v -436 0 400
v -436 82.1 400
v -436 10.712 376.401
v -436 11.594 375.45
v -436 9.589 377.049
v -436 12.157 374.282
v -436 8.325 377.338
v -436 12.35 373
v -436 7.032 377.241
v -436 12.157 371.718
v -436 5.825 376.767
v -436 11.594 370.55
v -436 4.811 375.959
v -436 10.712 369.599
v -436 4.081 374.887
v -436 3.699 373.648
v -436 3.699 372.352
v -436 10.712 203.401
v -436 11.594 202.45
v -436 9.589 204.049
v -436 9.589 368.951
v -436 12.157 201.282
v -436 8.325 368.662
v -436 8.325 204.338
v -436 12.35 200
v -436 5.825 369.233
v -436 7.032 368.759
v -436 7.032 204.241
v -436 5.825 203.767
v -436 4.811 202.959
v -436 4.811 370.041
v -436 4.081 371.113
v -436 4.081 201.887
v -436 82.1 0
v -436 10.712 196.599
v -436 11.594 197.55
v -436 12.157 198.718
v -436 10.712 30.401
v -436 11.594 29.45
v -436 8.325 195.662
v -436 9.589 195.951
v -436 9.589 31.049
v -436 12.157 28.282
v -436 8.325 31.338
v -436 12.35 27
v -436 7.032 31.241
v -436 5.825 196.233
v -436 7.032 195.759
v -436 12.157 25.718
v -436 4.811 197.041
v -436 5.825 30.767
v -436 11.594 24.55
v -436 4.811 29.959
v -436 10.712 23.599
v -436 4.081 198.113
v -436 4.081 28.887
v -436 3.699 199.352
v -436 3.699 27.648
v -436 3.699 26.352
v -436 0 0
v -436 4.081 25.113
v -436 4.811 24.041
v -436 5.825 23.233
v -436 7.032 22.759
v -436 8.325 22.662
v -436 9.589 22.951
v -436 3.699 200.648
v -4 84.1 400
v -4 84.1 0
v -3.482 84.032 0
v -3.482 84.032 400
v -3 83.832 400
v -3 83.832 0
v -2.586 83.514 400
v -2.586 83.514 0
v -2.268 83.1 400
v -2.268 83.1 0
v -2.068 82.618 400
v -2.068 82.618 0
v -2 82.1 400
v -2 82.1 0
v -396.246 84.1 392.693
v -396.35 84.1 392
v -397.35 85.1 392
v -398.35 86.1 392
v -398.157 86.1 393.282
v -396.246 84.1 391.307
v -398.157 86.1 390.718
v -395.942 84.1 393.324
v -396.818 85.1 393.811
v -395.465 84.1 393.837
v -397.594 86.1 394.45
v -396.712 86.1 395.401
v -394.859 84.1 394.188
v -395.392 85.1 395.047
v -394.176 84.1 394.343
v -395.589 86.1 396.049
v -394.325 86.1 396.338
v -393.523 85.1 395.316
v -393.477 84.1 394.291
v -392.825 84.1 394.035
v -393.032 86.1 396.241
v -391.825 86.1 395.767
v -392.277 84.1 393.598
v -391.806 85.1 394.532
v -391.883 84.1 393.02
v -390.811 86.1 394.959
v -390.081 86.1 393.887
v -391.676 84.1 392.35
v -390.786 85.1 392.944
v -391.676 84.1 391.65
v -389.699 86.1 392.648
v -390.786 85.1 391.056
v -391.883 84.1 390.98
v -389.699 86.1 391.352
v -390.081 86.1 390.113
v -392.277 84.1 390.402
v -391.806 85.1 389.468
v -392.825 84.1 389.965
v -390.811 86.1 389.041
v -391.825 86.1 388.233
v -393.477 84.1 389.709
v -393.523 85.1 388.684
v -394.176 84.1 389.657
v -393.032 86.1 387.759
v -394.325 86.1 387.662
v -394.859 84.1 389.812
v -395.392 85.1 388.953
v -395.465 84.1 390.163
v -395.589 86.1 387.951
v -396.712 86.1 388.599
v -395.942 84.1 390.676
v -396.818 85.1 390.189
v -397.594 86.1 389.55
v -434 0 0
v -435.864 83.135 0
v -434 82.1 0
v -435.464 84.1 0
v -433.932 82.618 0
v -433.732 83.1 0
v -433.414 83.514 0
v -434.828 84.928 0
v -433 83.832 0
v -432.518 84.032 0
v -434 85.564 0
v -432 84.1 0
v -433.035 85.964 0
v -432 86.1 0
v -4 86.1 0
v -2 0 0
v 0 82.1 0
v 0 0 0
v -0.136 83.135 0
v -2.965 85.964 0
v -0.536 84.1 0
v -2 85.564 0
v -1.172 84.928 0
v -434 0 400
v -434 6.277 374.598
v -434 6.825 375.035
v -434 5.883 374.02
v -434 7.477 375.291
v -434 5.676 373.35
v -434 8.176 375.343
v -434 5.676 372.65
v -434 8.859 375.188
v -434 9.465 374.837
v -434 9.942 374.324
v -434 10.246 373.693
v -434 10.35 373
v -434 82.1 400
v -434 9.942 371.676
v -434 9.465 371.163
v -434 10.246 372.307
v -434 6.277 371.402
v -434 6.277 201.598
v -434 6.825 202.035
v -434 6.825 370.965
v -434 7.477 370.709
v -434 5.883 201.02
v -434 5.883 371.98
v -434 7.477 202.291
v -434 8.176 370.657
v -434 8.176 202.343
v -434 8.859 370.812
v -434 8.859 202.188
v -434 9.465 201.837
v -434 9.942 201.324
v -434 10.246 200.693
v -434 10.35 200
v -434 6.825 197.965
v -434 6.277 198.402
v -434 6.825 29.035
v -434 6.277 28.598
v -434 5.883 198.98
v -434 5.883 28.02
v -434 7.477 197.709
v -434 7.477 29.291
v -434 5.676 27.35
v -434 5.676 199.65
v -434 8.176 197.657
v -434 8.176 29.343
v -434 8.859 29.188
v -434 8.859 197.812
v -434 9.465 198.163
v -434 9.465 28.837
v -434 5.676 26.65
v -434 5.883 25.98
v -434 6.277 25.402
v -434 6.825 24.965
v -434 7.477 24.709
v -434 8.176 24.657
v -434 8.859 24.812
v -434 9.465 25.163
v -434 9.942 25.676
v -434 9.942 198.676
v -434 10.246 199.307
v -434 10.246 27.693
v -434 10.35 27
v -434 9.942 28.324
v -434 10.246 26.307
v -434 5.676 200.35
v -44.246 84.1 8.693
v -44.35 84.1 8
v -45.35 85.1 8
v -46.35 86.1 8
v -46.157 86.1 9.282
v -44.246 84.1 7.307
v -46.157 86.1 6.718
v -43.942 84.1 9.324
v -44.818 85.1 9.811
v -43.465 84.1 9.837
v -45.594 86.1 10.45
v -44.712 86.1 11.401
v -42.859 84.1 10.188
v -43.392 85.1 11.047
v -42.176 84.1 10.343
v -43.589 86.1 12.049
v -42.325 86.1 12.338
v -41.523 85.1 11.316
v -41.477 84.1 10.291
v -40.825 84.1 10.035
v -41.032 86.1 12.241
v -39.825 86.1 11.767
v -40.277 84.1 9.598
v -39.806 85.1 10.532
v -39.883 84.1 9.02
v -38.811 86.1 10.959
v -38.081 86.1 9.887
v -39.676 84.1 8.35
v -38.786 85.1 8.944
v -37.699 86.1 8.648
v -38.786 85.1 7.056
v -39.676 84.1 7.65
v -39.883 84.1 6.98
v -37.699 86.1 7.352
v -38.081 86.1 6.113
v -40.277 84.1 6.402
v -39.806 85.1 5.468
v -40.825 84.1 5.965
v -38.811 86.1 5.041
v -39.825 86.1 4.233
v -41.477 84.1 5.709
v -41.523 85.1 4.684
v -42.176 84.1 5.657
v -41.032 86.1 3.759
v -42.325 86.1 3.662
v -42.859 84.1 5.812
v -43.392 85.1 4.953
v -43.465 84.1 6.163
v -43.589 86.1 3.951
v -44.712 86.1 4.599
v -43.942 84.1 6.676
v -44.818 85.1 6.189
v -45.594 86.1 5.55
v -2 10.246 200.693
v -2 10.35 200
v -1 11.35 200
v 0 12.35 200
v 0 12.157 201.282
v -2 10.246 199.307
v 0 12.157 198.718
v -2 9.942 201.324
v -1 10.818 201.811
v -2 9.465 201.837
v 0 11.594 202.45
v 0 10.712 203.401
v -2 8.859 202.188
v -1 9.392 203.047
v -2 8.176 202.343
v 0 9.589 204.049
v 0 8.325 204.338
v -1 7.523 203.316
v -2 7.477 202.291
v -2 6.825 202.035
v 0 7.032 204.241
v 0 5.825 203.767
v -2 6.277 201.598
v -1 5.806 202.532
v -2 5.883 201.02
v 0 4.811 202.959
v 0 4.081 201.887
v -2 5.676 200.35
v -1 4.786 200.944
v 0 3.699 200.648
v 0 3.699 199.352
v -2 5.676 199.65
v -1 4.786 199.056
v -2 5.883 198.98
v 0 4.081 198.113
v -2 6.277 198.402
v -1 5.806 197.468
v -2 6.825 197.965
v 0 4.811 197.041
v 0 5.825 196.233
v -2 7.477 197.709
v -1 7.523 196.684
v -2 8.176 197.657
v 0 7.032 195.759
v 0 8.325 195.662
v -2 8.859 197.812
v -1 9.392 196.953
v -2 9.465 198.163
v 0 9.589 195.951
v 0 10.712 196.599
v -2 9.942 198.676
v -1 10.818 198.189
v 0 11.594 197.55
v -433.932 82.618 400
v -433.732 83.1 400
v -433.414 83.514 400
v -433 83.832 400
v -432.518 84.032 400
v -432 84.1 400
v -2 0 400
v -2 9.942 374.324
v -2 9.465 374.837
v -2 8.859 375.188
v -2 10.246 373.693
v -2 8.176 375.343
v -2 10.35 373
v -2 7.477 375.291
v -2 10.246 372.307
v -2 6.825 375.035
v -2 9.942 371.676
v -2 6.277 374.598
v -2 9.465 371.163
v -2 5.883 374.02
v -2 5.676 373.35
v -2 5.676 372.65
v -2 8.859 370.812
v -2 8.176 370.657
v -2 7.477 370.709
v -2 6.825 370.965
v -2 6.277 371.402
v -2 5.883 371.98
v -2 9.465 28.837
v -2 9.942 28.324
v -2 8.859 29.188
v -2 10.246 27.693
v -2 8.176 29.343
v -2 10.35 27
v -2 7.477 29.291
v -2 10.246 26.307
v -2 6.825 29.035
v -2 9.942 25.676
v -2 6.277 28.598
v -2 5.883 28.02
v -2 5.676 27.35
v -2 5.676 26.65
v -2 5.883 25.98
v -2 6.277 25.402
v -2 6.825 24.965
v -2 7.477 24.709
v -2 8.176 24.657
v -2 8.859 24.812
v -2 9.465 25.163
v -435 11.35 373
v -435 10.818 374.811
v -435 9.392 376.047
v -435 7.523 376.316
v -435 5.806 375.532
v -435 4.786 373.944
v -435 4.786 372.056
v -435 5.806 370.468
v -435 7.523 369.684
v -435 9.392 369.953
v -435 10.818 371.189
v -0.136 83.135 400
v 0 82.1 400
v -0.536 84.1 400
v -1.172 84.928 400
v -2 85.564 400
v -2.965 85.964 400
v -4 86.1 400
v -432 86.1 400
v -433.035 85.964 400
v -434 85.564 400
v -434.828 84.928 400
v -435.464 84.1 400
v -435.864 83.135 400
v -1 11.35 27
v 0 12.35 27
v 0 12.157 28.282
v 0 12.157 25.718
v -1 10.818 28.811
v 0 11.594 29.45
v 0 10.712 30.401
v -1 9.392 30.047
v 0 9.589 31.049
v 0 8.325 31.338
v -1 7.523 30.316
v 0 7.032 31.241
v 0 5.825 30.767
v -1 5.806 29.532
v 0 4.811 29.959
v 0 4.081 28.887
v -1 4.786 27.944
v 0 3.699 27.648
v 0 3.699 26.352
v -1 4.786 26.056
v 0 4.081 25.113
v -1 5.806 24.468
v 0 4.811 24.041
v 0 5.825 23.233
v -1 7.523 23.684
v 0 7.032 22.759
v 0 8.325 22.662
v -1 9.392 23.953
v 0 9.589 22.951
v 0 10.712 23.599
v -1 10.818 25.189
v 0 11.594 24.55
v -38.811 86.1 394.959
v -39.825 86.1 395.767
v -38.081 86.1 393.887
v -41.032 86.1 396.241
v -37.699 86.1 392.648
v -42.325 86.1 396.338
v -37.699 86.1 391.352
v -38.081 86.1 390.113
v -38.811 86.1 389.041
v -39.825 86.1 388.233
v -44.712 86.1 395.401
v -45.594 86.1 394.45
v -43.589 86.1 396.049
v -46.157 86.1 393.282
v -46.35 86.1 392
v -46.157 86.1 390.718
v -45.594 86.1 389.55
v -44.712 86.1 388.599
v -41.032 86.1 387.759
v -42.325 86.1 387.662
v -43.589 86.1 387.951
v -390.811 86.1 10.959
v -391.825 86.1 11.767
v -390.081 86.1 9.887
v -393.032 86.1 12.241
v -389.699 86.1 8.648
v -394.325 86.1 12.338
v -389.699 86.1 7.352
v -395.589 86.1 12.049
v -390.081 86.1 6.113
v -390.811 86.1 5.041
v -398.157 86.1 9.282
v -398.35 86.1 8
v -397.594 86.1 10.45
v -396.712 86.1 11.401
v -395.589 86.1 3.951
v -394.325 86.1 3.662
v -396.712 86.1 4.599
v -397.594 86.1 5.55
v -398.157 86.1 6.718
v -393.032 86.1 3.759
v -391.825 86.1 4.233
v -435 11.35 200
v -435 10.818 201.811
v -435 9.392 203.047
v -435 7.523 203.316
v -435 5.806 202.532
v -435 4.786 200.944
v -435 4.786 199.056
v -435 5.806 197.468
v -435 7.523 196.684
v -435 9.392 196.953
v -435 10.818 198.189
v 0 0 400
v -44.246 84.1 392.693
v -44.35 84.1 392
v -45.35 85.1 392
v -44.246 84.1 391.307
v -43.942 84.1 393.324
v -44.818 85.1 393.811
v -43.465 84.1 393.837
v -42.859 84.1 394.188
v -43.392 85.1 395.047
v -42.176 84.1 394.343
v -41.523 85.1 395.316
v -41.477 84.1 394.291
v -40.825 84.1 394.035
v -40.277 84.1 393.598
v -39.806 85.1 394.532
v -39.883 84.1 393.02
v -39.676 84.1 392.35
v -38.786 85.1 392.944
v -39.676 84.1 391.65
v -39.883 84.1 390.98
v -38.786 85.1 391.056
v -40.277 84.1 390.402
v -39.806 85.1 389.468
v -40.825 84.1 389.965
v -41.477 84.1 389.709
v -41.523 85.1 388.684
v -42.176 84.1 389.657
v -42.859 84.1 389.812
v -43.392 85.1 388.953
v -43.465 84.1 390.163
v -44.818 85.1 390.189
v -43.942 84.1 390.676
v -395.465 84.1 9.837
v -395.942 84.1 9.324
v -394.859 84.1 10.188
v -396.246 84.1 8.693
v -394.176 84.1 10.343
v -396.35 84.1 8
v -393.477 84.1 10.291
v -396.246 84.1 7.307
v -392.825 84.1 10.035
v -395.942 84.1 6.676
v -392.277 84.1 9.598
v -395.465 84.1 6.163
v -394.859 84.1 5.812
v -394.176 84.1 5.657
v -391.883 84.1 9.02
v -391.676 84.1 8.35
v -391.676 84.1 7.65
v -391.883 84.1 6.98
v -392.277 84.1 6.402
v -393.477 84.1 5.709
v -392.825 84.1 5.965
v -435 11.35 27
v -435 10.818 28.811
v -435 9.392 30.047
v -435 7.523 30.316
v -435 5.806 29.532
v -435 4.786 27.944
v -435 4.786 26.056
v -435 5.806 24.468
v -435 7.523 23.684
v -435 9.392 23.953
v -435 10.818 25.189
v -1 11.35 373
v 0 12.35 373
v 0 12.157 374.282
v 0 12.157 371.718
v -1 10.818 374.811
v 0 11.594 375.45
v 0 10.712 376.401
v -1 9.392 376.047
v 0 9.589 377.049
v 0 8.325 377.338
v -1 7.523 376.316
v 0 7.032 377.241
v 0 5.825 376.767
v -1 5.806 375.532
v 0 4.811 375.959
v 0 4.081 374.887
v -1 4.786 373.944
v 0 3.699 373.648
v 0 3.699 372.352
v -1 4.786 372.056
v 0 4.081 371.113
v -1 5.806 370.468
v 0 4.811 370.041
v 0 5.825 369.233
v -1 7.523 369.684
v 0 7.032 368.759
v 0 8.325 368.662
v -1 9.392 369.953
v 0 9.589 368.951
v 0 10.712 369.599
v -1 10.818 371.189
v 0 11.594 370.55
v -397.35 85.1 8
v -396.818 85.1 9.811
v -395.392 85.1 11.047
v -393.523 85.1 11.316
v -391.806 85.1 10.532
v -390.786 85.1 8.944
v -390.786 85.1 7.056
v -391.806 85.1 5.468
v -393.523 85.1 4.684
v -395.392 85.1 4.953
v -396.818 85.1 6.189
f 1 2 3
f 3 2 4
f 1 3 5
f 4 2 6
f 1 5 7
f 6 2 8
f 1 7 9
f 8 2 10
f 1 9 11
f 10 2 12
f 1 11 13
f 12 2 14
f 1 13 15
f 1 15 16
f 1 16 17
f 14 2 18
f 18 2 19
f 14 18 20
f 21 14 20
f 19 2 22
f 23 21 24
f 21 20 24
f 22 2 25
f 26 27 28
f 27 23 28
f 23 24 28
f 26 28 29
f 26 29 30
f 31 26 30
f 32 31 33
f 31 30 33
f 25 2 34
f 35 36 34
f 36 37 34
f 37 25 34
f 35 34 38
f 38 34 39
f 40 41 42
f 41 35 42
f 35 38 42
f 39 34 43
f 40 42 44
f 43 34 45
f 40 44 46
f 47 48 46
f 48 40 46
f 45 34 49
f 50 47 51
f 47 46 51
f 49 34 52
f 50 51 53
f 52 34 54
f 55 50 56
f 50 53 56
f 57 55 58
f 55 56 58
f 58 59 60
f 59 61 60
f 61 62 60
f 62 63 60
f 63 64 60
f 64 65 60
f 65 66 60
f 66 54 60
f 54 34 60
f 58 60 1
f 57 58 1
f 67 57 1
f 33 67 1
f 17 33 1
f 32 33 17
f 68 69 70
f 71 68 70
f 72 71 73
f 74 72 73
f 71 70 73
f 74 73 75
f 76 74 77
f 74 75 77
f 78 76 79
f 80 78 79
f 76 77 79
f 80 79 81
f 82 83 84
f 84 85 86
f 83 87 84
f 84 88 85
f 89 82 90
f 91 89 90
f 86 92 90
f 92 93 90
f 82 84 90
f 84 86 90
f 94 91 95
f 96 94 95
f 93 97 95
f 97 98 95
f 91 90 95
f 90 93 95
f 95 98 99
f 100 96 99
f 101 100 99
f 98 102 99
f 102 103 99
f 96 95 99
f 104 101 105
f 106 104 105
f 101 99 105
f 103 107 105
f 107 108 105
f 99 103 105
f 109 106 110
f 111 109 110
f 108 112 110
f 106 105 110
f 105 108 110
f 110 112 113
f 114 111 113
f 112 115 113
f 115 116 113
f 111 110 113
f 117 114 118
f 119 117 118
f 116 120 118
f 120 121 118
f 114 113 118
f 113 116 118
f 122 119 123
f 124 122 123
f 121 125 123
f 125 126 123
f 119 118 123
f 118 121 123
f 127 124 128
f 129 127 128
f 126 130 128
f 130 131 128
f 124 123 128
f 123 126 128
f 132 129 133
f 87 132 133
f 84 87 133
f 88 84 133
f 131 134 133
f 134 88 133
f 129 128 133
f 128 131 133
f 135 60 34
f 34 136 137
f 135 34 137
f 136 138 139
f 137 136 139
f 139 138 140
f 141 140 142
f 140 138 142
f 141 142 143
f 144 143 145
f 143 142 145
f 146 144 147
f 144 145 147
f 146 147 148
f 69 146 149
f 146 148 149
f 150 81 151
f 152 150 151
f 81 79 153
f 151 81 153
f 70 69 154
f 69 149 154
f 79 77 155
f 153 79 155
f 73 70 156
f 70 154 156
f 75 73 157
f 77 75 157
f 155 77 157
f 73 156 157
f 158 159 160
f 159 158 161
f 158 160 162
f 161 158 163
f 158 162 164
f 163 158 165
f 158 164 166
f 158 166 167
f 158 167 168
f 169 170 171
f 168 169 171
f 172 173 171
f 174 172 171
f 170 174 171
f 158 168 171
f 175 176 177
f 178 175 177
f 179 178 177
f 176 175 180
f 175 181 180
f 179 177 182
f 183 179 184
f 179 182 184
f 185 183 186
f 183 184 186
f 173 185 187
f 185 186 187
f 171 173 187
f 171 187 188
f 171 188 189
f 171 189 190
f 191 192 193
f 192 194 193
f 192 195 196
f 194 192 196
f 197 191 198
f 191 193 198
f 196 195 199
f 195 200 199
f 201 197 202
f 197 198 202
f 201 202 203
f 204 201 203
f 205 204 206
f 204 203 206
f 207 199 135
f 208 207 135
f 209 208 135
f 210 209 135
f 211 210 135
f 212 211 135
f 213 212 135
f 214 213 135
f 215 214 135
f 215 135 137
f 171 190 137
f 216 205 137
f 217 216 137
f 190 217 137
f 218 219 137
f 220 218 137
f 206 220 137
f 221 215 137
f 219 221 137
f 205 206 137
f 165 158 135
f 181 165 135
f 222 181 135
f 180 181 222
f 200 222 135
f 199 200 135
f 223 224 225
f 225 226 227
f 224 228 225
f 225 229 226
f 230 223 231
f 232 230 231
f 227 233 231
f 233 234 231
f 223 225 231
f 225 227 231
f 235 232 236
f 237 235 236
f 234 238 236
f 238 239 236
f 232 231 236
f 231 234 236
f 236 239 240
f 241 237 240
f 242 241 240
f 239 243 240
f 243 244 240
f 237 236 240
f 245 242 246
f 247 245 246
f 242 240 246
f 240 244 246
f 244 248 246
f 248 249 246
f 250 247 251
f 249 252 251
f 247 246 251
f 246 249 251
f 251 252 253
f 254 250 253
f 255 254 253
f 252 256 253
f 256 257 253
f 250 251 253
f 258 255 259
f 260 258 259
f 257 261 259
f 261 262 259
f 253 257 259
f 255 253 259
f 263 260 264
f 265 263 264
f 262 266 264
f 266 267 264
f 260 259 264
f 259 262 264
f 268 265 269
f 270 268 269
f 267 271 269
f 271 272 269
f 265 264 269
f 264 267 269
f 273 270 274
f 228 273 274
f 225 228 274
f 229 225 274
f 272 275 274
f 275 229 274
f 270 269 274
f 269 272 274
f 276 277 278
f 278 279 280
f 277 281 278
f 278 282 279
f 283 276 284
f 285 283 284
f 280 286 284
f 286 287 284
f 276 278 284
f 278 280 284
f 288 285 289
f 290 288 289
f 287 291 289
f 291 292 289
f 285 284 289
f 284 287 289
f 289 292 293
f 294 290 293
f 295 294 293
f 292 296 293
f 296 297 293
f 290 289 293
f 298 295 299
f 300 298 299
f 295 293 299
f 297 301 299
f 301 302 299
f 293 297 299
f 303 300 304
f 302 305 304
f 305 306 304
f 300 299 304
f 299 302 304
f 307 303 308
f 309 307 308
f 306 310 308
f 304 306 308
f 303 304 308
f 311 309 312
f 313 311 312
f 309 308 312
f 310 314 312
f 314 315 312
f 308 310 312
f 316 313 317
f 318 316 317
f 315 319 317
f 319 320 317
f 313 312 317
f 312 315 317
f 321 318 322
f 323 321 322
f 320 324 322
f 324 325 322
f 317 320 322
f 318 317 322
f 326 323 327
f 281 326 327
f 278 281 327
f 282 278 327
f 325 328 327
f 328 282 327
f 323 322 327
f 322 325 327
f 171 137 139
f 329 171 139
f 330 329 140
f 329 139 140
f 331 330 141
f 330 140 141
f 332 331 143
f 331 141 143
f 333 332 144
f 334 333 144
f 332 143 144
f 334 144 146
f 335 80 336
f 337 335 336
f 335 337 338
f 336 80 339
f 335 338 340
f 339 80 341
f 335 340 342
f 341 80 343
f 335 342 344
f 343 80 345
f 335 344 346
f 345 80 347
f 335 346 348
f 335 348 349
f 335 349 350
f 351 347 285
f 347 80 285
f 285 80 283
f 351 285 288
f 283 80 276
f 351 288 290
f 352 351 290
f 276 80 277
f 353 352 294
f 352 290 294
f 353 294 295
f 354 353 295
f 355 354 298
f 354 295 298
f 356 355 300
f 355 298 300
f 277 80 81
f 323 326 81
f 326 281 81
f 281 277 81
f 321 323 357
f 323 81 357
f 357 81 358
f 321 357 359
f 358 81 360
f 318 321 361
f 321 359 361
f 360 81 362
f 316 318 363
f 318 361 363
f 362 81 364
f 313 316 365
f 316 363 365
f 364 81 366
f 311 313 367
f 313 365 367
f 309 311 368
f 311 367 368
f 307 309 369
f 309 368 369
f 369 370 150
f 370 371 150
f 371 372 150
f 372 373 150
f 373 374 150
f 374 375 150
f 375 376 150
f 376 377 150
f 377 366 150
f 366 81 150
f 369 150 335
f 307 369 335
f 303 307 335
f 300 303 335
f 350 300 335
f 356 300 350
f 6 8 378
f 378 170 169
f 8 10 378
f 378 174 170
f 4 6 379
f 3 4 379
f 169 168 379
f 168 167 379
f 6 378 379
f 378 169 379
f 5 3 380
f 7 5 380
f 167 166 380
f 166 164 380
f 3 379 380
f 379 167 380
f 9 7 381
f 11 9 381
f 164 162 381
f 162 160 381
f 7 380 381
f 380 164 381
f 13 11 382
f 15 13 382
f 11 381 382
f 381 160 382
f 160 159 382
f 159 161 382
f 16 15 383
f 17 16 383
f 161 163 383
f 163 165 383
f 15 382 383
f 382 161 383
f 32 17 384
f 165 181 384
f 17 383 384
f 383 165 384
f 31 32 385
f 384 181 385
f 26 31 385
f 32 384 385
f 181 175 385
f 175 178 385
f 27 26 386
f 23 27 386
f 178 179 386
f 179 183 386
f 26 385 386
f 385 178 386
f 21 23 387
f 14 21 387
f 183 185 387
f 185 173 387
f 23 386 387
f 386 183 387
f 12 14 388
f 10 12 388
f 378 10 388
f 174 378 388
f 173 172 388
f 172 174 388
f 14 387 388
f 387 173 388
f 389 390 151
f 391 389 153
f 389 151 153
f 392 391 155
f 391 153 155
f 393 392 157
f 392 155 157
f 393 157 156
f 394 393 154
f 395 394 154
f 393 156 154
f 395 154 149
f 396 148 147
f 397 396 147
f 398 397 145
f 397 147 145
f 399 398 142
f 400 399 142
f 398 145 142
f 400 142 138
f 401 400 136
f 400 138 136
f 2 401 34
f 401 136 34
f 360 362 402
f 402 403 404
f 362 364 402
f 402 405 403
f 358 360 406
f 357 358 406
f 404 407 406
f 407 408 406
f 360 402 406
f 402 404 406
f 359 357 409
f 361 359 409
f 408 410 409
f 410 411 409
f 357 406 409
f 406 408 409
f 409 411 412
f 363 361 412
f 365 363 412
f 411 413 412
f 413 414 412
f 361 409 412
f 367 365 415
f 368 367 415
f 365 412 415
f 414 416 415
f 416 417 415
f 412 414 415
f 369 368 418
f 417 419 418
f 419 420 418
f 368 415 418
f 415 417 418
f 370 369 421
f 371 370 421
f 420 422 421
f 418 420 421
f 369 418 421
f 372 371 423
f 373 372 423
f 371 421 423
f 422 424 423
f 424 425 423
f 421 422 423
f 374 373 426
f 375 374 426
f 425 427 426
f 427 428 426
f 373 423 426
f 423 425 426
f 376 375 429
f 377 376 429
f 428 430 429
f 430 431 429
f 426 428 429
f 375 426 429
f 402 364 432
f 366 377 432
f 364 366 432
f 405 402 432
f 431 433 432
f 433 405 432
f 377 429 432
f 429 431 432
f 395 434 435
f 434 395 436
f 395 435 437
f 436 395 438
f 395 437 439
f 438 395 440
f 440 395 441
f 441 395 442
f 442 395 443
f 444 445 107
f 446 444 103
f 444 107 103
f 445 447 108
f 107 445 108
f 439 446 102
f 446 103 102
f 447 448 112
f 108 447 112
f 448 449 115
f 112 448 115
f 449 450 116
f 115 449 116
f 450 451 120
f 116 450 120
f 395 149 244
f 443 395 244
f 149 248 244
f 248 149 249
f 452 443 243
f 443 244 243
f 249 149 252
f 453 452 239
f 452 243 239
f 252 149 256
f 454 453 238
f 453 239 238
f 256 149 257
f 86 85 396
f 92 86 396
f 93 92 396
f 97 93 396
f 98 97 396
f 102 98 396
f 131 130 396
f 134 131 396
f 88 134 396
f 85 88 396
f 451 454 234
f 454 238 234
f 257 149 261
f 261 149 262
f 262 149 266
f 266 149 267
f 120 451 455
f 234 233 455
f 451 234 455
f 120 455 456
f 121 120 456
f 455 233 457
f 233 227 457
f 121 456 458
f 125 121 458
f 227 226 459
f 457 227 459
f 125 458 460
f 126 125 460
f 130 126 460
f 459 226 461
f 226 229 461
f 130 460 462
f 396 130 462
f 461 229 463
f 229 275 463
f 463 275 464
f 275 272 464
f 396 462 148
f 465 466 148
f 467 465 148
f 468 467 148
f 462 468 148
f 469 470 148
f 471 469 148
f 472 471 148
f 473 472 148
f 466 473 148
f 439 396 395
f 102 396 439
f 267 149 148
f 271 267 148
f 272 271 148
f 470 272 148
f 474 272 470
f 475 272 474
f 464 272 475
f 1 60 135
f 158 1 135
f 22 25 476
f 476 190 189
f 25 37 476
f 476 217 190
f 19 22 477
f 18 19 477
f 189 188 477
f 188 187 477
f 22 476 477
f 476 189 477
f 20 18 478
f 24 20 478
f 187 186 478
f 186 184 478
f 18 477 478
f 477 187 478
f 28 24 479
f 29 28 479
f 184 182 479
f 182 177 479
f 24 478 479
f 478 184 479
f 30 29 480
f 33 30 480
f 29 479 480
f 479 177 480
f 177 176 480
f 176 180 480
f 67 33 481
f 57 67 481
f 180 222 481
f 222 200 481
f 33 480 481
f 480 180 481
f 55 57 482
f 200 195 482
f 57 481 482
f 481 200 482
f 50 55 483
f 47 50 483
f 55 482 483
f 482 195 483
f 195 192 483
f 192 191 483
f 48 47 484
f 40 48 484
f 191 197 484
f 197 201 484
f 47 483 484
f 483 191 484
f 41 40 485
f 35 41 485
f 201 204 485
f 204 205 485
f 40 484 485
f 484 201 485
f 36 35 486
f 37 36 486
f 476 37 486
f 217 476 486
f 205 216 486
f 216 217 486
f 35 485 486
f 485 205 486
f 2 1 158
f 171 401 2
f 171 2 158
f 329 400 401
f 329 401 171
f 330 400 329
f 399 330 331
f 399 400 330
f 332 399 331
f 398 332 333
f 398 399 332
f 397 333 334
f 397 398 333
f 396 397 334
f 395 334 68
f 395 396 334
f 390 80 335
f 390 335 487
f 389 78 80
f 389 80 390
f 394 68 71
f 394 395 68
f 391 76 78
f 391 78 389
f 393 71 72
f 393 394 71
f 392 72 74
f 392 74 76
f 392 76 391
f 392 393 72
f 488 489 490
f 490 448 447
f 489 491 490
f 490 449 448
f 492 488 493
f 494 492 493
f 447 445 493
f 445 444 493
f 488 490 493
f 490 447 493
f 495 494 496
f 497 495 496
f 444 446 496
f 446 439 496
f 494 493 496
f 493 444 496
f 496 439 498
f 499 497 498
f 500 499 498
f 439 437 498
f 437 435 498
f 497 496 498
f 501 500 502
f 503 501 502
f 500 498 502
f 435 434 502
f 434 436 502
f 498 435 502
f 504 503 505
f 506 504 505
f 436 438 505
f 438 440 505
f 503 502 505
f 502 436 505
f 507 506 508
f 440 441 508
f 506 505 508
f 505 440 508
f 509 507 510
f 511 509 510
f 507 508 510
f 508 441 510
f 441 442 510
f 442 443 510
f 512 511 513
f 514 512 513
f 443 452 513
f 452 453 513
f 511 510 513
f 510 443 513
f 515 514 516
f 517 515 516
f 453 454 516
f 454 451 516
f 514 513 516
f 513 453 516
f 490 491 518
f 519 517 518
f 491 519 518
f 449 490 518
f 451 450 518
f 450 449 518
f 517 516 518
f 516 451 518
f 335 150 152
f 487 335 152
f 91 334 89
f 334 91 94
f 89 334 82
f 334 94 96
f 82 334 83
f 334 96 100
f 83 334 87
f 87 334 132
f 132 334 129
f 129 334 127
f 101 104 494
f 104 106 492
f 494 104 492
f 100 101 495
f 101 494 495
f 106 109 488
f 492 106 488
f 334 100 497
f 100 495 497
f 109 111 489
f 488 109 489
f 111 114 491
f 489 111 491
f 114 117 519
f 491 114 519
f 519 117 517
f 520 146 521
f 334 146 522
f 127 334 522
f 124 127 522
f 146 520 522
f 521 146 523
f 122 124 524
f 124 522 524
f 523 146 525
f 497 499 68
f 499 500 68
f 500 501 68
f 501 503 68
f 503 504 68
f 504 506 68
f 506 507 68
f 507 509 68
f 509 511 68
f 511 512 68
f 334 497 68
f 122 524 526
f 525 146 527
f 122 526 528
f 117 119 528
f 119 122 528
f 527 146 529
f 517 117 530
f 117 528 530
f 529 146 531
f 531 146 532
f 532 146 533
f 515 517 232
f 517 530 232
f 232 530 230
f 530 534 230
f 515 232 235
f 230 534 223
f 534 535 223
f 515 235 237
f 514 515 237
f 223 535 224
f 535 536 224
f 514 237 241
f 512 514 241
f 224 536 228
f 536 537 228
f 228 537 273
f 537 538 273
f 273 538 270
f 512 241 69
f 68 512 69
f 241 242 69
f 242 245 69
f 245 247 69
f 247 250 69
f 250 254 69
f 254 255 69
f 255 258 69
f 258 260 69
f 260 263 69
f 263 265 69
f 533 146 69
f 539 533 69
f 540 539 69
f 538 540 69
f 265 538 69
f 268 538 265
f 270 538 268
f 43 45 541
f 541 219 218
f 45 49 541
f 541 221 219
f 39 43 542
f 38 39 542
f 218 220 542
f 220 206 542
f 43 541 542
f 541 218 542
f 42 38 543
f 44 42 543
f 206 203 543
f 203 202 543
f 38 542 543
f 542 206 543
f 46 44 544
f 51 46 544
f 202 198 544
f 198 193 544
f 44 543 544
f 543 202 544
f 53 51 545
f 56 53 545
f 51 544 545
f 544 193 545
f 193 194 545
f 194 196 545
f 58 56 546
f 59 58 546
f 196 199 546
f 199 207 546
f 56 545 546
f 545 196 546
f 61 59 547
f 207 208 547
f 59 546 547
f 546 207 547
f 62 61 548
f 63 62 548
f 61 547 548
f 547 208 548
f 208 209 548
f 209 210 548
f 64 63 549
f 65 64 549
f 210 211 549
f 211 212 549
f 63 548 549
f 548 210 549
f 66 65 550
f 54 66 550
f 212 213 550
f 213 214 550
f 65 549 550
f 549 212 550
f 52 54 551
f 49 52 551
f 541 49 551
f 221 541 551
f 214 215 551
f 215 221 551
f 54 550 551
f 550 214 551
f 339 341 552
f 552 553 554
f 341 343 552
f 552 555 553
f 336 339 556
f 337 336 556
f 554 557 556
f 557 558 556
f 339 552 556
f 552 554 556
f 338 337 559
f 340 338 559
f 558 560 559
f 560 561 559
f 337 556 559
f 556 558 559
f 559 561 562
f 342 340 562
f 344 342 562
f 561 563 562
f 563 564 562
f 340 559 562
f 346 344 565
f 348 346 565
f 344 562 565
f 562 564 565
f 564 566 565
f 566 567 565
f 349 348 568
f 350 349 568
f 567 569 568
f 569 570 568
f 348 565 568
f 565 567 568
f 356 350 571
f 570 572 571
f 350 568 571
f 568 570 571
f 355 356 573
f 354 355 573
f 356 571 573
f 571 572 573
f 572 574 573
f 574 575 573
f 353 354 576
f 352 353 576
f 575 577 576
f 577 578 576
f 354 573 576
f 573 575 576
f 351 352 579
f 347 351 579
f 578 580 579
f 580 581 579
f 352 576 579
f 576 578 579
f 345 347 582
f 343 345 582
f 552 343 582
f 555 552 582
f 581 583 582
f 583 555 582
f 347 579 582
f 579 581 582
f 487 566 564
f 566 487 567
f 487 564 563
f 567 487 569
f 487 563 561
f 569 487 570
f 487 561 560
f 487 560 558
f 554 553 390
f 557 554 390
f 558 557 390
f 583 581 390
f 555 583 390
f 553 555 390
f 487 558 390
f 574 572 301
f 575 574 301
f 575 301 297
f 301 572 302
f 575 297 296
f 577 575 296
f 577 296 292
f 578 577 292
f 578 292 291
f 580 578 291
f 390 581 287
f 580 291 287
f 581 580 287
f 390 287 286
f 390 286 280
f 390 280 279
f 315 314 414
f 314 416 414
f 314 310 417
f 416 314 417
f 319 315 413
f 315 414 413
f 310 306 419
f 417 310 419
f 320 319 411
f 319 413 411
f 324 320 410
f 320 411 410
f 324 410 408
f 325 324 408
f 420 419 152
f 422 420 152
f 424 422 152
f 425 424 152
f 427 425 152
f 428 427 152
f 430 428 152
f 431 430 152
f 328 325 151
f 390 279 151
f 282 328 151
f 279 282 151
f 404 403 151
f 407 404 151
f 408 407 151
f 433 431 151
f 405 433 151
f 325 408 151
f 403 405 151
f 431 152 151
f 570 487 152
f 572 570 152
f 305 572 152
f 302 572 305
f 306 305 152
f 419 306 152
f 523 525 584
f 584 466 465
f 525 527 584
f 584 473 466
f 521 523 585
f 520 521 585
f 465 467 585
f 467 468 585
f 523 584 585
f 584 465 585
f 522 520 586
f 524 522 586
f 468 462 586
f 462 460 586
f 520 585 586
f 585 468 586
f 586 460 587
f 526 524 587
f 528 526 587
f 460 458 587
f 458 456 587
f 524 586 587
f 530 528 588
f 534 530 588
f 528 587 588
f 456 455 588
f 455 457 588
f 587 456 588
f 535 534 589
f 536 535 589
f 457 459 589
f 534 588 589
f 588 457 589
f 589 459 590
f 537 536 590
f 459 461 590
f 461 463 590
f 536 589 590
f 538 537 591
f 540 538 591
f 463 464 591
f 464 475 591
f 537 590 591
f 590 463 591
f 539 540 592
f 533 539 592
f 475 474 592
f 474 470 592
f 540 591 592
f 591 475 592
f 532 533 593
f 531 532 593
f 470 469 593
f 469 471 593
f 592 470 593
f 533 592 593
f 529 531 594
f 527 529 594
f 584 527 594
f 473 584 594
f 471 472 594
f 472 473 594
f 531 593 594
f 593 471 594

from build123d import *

# Parameters (mm, degrees)
SM_BASE_FLANGE_1_DEPTH = 400
SKETCH_8_R             = 2.3
CUT_EXTRUDE_2_DEPTH    = 598.920738894
SKETCH_9_R             = 2.3
CUT_EXTRUDE_3_DEPTH    = 10
CHAMFER_1_SIZE         = 2.05


# Sheet-metal steps are written as plain solids
with BuildPart() as part:
    # Sketch 1 → Базовая кромка1 (new body)
    with BuildSketch(Plane.XY):
        with BuildLine():
            Line((0, 0), (0, 82.1))
            ThreePointArc((0, 82.1), (-1.171572875, 84.928427125), (-4, 86.1))
            Line((-4, 86.1), (-432, 86.1))
            ThreePointArc((-432, 86.1), (-434.828427125, 84.928427125), (-436, 82.1))
            Line((-436, 82.1), (-436, 0))
            Line((-436, 0), (-434, 0))
            Line((-434, 0), (-434, 82.1))
            ThreePointArc((-434, 82.1), (-433.414213562, 83.514213562), (-432, 84.1))
            Line((-432, 84.1), (-4, 84.1))
            ThreePointArc((-4, 84.1), (-2.585786438, 83.514213562), (-2, 82.1))
            Line((-2, 82.1), (-2, 0))
            Line((-2, 0), (0, 0))
        make_face()
    extrude(amount=SM_BASE_FLANGE_1_DEPTH)

    # Эскиз8 → Вырез-Вытянуть2 (cut, through all)
    with BuildSketch(Plane(origin=(0, 0, 0), x_dir=(0, 0, -1), z_dir=(1, 0, 0))):
        with Locations(Location((-373, 8, 0), (0, 0, 90))):
            Circle(SKETCH_8_R)
        with Locations(Location((-200, 8, 0), (0, 0, 90))):
            Circle(SKETCH_8_R)
        with Locations(Location((-27, 8, 0), (0, 0, 90))):
            Circle(SKETCH_8_R)
    extrude(amount=-CUT_EXTRUDE_2_DEPTH, mode=Mode.SUBTRACT)

    # Эскиз9 → Вырез-Вытянуть3 (cut)
    with BuildSketch(Plane(origin=(0, 86.1, 0), x_dir=(1, 0, 0), z_dir=(0, 1, 0))):
        with Locations(Location((-42, -392, 0), (0, 0, 180))):
            Circle(SKETCH_9_R)
        with Locations(Location((-394, -392, 0), (0, 0, 180))):
            Circle(SKETCH_9_R)
        with Locations(Location((-42, -8, 0), (0, 0, 180))):
            Circle(SKETCH_9_R)
        with Locations(Location((-394, -8, 0), (0, 0, 180))):
            Circle(SKETCH_9_R)
    extrude(amount=-CUT_EXTRUDE_3_DEPTH, mode=Mode.SUBTRACT)

    # Фаска1
    # the kernel refuses this chamfer: 2.05 mm, written as the material it takes off along each edge
    with BuildSketch(Plane(origin=(-436, 8, 373), x_dir=(0, 1, 0), z_dir=(0, 0, -1))) as chamfer_1_piece_1:
        Polygon((2.3 + CHAMFER_1_SIZE, 0), (2.3, CHAMFER_1_SIZE), (2.3, 0), align=None)
    revolve(axis=Axis((-436, 8, 373), (1, 0, 0)), mode=Mode.SUBTRACT)
    with BuildSketch(Plane(origin=(0, 8, 373), x_dir=(0, 1, 0), z_dir=(0, 0, -1))) as chamfer_1_piece_2:
        Polygon((2.3, -CHAMFER_1_SIZE), (2.3 + CHAMFER_1_SIZE, 0), (2.3, 0), align=None)
    revolve(axis=Axis((0, 8, 373), (1, 0, 0)), mode=Mode.SUBTRACT)
    with BuildSketch(Plane(origin=(-436, 8, 200), x_dir=(0, 1, 0), z_dir=(0, 0, -1))) as chamfer_1_piece_3:
        Polygon((2.3 + CHAMFER_1_SIZE, 0), (2.3, CHAMFER_1_SIZE), (2.3, 0), align=None)
    revolve(axis=Axis((-436, 8, 200), (1, 0, 0)), mode=Mode.SUBTRACT)
    with BuildSketch(Plane(origin=(0, 8, 200), x_dir=(0, 1, 0), z_dir=(0, 0, -1))) as chamfer_1_piece_4:
        Polygon((2.3, -CHAMFER_1_SIZE), (2.3 + CHAMFER_1_SIZE, 0), (2.3, 0), align=None)
    revolve(axis=Axis((0, 8, 200), (1, 0, 0)), mode=Mode.SUBTRACT)
    with BuildSketch(Plane(origin=(-436, 8, 27), x_dir=(0, 1, 0), z_dir=(0, 0, -1))) as chamfer_1_piece_5:
        Polygon((2.3 + CHAMFER_1_SIZE, 0), (2.3, CHAMFER_1_SIZE), (2.3, 0), align=None)
    revolve(axis=Axis((-436, 8, 27), (1, 0, 0)), mode=Mode.SUBTRACT)
    with BuildSketch(Plane(origin=(0, 8, 27), x_dir=(0, 1, 0), z_dir=(0, 0, -1))) as chamfer_1_piece_6:
        Polygon((2.3, -CHAMFER_1_SIZE), (2.3 + CHAMFER_1_SIZE, 0), (2.3, 0), align=None)
    revolve(axis=Axis((0, 8, 27), (1, 0, 0)), mode=Mode.SUBTRACT)
    with BuildSketch(Plane(origin=(-42, 86.1, 392), x_dir=(-1, 0, 0), z_dir=(0, 0, -1))) as chamfer_1_piece_7:
        Polygon((2.3, -CHAMFER_1_SIZE), (2.3 + CHAMFER_1_SIZE, 0), (2.3, 0), align=None)
    revolve(axis=Axis((-42, 86.1, 392), (0, 1, 0)), mode=Mode.SUBTRACT)
    with BuildSketch(Plane(origin=(-394, 86.1, 392), x_dir=(-1, 0, 0), z_dir=(0, 0, -1))) as chamfer_1_piece_8:
        Polygon((2.3, -CHAMFER_1_SIZE), (2.3 + CHAMFER_1_SIZE, 0), (2.3, 0), align=None)
    revolve(axis=Axis((-394, 86.1, 392), (0, 1, 0)), mode=Mode.SUBTRACT)
    with BuildSketch(Plane(origin=(-42, 86.1, 8), x_dir=(-1, 0, 0), z_dir=(0, 0, -1))) as chamfer_1_piece_9:
        Polygon((2.3, -CHAMFER_1_SIZE), (2.3 + CHAMFER_1_SIZE, 0), (2.3, 0), align=None)
    revolve(axis=Axis((-42, 86.1, 8), (0, 1, 0)), mode=Mode.SUBTRACT)
    with BuildSketch(Plane(origin=(-394, 86.1, 8), x_dir=(-1, 0, 0), z_dir=(0, 0, -1))) as chamfer_1_piece_10:
        Polygon((2.3, -CHAMFER_1_SIZE), (2.3 + CHAMFER_1_SIZE, 0), (2.3, 0), align=None)
    revolve(axis=Axis((-394, 86.1, 8), (0, 1, 0)), mode=Mode.SUBTRACT)


solid = part.part
